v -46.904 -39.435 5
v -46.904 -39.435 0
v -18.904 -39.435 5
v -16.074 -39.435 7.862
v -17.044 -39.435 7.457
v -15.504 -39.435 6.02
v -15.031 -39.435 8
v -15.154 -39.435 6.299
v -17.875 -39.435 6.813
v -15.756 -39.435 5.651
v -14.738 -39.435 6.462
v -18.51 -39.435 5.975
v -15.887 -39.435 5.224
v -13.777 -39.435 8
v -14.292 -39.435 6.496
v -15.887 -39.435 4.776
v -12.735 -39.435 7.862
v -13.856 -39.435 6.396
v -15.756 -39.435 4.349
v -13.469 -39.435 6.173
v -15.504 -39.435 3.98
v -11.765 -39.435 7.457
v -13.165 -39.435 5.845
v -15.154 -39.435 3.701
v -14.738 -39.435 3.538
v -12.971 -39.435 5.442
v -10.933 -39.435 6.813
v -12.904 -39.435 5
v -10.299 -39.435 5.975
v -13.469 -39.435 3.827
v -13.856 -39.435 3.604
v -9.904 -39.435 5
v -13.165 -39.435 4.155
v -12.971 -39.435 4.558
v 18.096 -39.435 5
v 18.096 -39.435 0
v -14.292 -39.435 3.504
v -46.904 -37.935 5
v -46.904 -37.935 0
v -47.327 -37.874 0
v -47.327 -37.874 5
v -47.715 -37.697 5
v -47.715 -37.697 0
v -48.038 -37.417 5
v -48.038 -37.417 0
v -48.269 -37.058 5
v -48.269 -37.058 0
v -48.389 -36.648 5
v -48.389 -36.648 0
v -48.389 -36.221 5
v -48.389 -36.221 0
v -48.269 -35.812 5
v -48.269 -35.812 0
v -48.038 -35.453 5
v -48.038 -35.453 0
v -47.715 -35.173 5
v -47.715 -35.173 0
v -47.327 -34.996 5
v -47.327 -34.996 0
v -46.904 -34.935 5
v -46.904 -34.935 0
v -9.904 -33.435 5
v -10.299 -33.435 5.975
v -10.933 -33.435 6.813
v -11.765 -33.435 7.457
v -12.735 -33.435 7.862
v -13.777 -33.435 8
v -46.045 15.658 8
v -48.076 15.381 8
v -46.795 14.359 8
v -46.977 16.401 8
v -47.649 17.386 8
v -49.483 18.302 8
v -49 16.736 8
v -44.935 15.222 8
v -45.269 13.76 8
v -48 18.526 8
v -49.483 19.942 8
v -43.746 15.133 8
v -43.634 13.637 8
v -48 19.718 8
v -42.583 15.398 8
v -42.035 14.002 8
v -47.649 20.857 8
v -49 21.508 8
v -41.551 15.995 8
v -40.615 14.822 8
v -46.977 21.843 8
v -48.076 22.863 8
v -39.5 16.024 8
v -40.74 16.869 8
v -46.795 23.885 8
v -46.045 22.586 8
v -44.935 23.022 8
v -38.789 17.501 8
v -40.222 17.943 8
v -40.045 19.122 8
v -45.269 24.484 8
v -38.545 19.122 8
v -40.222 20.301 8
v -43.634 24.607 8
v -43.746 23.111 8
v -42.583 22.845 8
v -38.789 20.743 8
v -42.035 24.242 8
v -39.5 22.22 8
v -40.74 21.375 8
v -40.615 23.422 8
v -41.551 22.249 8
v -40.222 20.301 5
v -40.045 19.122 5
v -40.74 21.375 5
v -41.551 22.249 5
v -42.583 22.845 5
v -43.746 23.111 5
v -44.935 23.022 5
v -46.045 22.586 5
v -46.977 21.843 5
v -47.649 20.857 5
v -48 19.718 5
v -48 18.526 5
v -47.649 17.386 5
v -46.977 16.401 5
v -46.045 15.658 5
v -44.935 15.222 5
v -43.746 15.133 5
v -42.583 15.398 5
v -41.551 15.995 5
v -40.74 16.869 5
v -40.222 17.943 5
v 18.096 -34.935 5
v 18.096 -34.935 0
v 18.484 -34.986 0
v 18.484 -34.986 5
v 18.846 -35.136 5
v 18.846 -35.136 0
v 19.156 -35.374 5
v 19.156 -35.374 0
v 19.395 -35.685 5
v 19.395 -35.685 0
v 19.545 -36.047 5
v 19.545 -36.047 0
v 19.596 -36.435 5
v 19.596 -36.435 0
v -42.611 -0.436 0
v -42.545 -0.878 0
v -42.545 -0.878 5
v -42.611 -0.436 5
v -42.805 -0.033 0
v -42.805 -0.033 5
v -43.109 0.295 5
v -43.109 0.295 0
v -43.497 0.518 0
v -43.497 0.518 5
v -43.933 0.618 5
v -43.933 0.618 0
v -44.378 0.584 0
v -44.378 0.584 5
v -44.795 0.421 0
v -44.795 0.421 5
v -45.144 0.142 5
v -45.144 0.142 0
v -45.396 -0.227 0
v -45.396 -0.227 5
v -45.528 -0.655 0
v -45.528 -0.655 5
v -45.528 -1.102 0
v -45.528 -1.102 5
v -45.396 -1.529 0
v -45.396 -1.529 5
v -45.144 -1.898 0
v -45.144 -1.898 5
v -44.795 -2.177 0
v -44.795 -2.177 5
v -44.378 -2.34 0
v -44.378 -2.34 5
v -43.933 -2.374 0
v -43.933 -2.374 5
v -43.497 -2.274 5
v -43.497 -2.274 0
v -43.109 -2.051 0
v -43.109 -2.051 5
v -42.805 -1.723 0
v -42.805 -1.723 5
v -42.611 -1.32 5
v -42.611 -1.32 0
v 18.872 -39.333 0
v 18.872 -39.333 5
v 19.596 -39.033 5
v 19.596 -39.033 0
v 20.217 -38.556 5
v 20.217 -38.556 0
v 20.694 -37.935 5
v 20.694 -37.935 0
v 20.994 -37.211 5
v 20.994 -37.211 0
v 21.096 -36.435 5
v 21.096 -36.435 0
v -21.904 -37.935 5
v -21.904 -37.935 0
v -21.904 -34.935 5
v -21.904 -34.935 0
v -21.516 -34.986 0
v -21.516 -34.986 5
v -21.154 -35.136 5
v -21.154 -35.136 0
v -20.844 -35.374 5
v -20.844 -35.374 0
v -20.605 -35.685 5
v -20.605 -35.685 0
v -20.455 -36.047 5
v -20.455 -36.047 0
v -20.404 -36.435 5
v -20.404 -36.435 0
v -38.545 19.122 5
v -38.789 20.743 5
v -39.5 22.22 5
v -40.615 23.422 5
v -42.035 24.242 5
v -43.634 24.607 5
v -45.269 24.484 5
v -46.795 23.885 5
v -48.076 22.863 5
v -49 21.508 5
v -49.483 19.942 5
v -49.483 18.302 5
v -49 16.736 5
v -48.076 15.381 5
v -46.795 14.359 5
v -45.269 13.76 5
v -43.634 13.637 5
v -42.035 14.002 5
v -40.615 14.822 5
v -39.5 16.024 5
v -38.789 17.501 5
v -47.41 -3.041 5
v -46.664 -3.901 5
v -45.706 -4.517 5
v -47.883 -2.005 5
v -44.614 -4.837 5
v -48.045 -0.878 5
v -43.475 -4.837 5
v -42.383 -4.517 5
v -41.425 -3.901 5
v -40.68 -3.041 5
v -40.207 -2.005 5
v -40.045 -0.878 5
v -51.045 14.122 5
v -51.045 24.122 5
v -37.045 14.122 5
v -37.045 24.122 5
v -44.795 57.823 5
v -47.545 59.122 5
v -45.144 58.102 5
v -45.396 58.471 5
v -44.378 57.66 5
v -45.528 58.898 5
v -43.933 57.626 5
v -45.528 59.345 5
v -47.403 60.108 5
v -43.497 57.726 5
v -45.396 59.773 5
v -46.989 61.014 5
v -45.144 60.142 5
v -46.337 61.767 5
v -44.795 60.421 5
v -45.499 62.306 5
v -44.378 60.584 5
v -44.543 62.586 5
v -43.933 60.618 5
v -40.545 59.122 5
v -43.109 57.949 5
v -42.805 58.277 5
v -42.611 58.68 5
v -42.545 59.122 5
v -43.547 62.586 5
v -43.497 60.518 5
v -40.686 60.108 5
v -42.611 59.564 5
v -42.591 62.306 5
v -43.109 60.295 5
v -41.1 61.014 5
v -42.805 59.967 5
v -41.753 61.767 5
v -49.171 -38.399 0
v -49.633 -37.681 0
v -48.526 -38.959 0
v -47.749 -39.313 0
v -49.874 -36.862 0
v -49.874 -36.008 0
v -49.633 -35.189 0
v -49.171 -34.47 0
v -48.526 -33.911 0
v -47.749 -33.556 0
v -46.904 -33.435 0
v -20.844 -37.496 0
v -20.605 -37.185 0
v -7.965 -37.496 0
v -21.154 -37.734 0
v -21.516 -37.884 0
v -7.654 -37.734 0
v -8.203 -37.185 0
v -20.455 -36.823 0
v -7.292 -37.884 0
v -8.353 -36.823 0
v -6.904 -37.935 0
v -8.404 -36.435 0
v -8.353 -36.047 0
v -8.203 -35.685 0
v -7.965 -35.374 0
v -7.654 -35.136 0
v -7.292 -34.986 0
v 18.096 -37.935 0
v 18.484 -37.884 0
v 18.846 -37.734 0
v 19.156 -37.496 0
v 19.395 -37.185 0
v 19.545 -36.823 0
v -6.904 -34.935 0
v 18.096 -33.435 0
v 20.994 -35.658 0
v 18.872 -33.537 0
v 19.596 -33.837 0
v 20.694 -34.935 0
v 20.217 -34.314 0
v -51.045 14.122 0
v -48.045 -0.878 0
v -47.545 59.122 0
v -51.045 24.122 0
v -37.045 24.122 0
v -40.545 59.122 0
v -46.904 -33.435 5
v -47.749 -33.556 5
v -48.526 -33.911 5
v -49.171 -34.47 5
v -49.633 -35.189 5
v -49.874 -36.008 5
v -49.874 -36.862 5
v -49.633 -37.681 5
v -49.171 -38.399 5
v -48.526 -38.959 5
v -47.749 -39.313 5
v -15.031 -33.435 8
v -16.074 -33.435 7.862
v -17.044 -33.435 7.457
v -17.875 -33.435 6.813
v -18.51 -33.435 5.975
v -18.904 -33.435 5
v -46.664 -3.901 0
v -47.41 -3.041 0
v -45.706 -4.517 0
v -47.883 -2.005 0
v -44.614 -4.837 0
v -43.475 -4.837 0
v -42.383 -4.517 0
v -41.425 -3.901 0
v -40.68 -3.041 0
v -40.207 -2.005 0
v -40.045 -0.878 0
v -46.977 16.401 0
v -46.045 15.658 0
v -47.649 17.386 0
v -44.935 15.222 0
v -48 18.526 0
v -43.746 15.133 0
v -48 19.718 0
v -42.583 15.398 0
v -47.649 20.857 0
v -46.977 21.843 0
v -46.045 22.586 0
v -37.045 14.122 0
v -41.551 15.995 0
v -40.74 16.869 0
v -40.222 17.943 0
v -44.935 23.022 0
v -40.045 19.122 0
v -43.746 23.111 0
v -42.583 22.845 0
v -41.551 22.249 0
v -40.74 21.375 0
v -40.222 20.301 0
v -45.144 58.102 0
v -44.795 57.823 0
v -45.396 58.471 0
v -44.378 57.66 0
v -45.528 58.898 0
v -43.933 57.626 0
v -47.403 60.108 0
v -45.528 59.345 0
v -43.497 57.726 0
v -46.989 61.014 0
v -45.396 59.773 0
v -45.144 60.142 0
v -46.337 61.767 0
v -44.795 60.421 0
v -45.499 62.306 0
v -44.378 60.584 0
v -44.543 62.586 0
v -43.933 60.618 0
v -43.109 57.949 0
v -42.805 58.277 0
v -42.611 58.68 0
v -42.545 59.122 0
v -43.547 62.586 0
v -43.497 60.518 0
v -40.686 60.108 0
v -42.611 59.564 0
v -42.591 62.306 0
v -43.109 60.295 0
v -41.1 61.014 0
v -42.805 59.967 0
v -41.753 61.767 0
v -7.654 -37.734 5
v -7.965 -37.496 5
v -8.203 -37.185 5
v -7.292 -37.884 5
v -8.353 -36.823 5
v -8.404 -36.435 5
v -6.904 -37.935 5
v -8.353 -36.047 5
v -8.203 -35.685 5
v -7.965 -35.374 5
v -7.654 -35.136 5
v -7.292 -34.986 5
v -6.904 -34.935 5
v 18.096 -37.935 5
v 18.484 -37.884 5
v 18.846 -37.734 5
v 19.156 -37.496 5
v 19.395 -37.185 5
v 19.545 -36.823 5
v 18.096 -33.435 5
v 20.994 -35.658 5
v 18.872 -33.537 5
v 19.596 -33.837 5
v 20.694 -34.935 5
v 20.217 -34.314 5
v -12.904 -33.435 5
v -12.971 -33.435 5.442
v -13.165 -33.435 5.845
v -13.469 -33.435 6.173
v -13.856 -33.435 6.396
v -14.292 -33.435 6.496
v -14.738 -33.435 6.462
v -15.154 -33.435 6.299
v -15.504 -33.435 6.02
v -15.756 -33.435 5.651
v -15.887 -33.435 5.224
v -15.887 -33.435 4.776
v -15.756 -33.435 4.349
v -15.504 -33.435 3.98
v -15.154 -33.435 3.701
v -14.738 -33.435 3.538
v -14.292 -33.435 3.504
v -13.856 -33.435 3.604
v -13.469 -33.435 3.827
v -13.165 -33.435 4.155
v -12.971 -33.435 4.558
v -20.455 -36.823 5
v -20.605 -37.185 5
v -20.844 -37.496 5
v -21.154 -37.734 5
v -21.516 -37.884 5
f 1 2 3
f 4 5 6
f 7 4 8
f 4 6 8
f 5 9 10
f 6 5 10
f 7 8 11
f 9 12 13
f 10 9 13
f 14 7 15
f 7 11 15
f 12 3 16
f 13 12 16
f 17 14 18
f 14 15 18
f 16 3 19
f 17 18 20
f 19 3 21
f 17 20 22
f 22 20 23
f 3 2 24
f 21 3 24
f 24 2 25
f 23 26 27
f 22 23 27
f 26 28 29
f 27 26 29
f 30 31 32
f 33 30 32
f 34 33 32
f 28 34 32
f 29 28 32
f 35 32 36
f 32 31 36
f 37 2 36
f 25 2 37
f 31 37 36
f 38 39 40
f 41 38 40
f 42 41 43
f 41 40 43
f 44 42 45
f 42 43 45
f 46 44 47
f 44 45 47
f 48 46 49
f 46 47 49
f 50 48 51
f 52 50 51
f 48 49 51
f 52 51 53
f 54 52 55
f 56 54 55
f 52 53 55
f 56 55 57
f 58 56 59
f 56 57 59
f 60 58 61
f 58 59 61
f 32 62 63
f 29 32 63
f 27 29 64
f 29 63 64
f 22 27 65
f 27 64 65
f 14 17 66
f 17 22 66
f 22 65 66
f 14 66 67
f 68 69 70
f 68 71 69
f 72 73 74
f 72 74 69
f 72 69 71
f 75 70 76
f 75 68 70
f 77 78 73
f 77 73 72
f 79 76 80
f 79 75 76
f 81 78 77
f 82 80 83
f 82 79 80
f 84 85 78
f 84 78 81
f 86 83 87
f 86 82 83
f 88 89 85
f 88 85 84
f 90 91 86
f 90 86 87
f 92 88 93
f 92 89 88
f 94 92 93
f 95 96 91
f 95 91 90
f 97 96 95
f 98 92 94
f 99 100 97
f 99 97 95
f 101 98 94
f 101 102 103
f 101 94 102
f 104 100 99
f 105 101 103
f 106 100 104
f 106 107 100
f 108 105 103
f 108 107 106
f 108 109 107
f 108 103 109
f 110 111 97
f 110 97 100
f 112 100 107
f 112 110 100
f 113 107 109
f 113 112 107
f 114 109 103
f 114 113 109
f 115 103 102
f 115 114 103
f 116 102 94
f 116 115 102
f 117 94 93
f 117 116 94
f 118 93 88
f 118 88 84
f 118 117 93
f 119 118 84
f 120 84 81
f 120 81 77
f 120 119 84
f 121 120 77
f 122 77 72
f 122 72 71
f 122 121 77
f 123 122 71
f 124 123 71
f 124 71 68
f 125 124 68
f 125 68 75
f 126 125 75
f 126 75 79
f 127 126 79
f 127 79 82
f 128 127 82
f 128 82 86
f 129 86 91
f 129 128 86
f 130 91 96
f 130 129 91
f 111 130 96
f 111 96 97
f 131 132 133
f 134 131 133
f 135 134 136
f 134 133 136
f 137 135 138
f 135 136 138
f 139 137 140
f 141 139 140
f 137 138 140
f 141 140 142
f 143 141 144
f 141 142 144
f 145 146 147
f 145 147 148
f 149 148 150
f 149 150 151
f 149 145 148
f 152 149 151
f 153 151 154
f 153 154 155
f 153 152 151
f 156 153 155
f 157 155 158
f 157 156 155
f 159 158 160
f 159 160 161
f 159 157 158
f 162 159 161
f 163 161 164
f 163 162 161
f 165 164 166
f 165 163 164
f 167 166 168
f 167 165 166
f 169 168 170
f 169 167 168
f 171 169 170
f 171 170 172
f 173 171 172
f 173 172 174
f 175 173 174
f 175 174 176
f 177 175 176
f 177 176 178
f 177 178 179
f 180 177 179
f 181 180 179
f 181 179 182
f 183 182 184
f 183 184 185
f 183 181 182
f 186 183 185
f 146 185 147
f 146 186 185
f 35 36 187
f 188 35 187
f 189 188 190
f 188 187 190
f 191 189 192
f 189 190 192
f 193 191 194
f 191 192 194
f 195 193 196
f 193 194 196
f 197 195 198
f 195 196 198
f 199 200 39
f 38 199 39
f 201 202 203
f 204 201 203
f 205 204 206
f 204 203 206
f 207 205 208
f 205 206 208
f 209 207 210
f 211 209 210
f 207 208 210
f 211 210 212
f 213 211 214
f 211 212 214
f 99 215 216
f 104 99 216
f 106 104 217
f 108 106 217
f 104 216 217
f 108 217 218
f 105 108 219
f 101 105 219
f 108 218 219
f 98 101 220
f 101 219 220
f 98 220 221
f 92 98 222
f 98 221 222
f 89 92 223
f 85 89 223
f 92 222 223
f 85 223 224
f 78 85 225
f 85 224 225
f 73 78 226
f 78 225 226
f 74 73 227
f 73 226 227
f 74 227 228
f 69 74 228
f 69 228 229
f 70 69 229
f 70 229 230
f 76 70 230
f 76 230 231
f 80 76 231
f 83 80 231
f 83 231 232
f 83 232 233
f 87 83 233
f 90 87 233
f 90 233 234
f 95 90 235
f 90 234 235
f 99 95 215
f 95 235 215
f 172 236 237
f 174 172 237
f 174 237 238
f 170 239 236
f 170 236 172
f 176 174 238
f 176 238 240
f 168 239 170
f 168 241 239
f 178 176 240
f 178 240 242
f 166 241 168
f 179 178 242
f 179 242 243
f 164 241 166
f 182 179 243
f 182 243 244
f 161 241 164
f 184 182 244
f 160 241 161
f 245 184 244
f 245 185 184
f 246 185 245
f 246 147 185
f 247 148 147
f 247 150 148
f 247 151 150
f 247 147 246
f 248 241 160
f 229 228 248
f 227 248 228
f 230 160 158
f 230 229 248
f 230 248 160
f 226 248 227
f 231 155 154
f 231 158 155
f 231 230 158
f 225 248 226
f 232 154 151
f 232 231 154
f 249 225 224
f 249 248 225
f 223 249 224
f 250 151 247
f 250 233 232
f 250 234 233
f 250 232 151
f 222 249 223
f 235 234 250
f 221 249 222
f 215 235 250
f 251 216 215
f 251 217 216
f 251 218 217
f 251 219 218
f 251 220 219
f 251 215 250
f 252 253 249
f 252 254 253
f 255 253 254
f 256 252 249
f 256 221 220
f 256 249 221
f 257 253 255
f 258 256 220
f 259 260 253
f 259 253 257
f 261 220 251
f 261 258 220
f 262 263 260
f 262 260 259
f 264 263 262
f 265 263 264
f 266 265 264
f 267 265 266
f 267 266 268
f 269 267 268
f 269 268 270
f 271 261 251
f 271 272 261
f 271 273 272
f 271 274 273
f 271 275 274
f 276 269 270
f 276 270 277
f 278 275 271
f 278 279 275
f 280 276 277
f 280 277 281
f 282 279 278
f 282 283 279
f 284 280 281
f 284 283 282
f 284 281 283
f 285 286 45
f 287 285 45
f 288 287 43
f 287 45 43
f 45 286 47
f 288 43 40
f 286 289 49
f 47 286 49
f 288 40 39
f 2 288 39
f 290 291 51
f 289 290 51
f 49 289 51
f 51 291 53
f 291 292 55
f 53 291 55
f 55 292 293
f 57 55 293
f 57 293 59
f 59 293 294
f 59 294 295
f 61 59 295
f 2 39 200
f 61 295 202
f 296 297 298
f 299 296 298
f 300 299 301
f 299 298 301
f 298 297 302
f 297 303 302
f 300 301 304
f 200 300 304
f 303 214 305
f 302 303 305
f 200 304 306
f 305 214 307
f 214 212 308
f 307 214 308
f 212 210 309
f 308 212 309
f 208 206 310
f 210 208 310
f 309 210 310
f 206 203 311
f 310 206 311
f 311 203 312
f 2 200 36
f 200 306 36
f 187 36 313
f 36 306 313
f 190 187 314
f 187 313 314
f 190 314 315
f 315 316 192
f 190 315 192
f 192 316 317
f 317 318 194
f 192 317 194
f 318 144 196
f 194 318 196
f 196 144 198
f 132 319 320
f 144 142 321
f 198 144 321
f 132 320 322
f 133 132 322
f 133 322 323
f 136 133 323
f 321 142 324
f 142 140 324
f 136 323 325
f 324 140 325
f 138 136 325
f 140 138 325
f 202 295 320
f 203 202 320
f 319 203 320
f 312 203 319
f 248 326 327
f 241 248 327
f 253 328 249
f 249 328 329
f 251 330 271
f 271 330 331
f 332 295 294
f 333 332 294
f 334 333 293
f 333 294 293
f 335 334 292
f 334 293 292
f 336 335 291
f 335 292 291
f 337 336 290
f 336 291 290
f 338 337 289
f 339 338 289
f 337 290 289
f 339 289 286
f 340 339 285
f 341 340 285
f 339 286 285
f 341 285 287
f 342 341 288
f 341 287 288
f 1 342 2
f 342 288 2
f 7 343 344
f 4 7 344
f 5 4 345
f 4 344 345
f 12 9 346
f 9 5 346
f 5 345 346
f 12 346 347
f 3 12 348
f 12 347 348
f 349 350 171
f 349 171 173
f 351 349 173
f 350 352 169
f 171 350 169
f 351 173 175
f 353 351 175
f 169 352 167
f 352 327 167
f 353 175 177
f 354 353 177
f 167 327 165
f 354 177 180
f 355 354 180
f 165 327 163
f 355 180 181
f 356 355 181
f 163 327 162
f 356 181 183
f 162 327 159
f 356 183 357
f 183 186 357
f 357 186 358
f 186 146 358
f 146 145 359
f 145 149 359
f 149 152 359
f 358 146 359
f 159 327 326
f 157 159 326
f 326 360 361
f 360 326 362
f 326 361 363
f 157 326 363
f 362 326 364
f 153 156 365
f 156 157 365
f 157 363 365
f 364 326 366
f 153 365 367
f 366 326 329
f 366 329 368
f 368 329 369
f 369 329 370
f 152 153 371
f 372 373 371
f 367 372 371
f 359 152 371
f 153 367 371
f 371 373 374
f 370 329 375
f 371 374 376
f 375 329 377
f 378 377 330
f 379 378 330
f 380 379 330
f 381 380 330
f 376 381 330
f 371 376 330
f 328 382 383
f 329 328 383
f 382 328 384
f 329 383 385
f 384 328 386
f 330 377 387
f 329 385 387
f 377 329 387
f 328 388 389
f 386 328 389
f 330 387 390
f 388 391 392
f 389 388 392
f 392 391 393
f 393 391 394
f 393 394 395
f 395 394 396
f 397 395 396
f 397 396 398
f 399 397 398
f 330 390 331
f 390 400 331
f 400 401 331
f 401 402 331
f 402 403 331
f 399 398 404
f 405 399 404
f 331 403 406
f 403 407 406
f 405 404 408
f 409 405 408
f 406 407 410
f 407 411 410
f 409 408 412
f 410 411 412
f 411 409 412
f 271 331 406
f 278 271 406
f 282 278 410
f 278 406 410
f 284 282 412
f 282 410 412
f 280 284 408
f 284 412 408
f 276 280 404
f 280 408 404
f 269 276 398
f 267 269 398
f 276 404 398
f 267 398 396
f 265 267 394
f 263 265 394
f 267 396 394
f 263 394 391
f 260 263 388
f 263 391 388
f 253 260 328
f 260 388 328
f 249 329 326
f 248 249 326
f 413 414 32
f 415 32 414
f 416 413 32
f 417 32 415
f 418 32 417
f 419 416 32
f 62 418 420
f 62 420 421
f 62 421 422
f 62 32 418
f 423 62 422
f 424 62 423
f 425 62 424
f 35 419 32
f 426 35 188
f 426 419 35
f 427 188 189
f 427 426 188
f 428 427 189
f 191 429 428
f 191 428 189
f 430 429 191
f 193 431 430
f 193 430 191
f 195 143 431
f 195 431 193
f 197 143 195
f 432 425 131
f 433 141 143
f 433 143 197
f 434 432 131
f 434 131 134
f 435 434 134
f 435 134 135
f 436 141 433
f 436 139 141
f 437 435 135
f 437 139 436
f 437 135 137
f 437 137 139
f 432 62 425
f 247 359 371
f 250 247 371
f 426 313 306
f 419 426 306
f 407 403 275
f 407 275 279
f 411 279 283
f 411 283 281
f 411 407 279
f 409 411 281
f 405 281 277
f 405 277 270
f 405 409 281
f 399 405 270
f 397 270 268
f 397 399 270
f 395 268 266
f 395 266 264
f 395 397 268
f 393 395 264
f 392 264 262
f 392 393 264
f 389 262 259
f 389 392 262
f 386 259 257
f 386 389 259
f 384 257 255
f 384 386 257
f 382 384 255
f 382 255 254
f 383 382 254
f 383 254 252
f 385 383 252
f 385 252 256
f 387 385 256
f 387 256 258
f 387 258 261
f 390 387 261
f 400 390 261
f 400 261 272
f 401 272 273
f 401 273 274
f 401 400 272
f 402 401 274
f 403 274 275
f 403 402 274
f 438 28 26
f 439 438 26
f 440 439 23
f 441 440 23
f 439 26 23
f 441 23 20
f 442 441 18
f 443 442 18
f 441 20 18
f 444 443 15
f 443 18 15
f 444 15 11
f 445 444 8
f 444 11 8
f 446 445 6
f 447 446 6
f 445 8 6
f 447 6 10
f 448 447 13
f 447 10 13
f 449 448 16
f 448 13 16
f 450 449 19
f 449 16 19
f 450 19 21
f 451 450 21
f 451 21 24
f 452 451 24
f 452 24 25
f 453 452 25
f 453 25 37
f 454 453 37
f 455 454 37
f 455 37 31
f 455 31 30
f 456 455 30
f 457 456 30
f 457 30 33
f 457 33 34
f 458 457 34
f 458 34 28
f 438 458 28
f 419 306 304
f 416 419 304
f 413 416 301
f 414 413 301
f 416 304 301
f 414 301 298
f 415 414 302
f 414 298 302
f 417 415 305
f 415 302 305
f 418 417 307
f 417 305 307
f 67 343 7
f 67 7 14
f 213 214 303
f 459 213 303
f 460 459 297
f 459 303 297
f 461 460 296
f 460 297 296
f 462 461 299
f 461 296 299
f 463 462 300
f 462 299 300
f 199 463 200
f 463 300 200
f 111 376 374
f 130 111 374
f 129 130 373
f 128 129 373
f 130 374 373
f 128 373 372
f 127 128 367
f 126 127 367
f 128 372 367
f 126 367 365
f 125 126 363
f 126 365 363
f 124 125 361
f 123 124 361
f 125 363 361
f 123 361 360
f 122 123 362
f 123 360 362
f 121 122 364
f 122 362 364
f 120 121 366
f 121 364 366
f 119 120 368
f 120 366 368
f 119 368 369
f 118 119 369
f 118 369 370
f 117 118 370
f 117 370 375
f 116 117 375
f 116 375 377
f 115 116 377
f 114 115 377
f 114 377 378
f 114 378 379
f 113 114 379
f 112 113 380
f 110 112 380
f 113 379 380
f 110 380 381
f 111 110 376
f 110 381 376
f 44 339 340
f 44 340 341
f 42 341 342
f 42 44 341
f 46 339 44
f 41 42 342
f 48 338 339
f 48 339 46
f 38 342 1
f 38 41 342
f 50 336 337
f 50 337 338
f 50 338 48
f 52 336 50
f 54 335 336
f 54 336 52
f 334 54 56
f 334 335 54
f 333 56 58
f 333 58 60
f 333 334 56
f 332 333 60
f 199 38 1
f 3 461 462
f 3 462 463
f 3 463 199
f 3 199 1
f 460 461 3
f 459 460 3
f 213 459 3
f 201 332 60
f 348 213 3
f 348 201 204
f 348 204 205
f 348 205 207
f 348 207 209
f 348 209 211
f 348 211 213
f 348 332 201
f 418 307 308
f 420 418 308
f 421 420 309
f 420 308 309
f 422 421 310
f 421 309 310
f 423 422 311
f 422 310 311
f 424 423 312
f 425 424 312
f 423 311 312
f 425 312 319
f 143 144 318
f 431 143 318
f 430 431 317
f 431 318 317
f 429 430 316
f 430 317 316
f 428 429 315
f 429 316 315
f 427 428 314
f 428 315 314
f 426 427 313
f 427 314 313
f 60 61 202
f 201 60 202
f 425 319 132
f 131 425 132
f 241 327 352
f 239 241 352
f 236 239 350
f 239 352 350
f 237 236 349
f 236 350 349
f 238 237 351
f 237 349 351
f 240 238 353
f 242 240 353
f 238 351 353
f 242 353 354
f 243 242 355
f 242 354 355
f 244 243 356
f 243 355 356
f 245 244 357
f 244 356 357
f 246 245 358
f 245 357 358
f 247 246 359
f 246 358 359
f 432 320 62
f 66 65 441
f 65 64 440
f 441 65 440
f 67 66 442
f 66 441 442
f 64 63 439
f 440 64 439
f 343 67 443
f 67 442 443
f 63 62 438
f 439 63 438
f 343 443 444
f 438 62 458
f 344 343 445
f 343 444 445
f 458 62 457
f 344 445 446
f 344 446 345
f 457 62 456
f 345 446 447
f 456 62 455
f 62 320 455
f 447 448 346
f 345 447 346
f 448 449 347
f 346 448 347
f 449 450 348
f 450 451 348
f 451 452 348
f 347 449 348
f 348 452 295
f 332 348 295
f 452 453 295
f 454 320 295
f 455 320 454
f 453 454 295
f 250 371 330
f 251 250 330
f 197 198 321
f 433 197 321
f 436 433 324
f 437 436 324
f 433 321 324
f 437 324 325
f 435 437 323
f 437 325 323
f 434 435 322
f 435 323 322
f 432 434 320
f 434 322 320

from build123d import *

# Parameters (mm, degrees)
F0_R         = 1.5
F1_DEPTH     = 5
F2_R         = 5.5
F2_R_2       = 4
F3_DEPTH     = 3
F5_DEPTH     = 5
F6_W         = 9
F6_H         = 6
F7_DEPTH     = 3
F8_R         = 1.5
F9_DEPTH     = 25
F10_T1_DEPTH = 25.364916731


# Not quite as in the source:
# - a fillet or chamfer that OpenCascade refuses, or shapes differently, is made with other operations: its cross-section is extruded or revolved along the edge and cut away or added


with BuildPart() as f1:
    # F0 (on Top) → F1 (new body)
    with BuildSketch(Plane.XY):
        with BuildLine():
            ThreePointArc((-48.0446585417, 19.1218993813), (-44.0446585417, 23.1218993813), (-40.0446585417, 19.1218993813))
            Line((-40.0446585417, 19.1218993813), (-37.0446585417, 19.1218993813))
            Line((-37.0446585417, 19.1218993813), (-37.0446585417, 24.1218993813))
            Line((-37.0446585417, 24.1218993813), (-40.5446585417, 59.1218993813))
            ThreePointArc((-40.5446585417, 59.1218993813), (-44.0446585417, 55.6218993813), (-47.5446585417, 59.1218993813))
            Line((-47.5446585417, 59.1218993813), (-51.0446585417, 24.1218993813))
            Line((-51.0446585417, 24.1218993813), (-51.0446585417, 19.1218993813))
            Line((-51.0446585417, 19.1218993813), (-48.0446585417, 19.1218993813))
        make_face()
        with BuildLine():
            Line((-37.0446585417, 19.1218993813), (-40.0446585417, 19.1218993813))
            ThreePointArc((-40.0446585417, 19.1218993813), (-44.0446585417, 15.1218993813), (-48.0446585417, 19.1218993813))
            Line((-48.0446585417, 19.1218993813), (-51.0446585417, 19.1218993813))
            Line((-51.0446585417, 19.1218993813), (-51.0446585417, 14.1218993813))
            Line((-51.0446585417, 14.1218993813), (-48.0446585417, -0.8781006187))
            ThreePointArc((-48.0446585417, -0.8781006187), (-44.0446585417, 3.1218993813), (-40.0446585417, -0.8781006187))
            Line((-40.0446585417, -0.8781006187), (-37.0446585417, 14.1218993813))
            Line((-37.0446585417, 14.1218993813), (-37.0446585417, 19.1218993813))
        make_face()
        with BuildLine():
            ThreePointArc((-48.0446585417, -0.8781006187), (-44.0446585417, -4.8781006187), (-40.0446585417, -0.8781006187))
            ThreePointArc((-40.0446585417, -0.8781006187), (-44.0446585417, 3.1218993813), (-48.0446585417, -0.8781006187))
        make_face()
        with Locations((-44.0446585417, -0.8781006187)):
            Circle(F0_R, mode=Mode.SUBTRACT)
        with BuildLine():
            ThreePointArc((-47.5446585417, 59.1218993813), (-44.0446585417, 55.6218993813), (-40.5446585417, 59.1218993813))
            ThreePointArc((-40.5446585417, 59.1218993813), (-44.0446585417, 62.6218993813), (-47.5446585417, 59.1218993813))
        make_face()
        with Locations((-44.0446585417, 59.1218993813)):
            Circle(F0_R, mode=Mode.SUBTRACT)
    extrude(amount=F1_DEPTH)

    # F2 (on face) → F3 (join)
    with BuildSketch(Plane.XY.offset(5)):
        with Locations((-44.0446585417, 19.1218993813)):
            Circle(F2_R)
        with Locations((-44.0446585417, 19.1218993813)):
            Circle(F2_R_2, mode=Mode.SUBTRACT)
    extrude(amount=F3_DEPTH)


with BuildPart() as f5:
    # F4 (on Top) → F5 (new body)
    with BuildSketch(Plane.XY):
        with BuildLine():
            ThreePointArc((-46.904212172, -33.4348478615), (-45.404212172, -33.8367716502), (-44.3061359607, -34.9348478615))
            Line((-44.3061359607, -34.9348478615), (-21.904212172, -34.9348478615))
            ThreePointArc((-21.904212172, -34.9348478615), (-20.8435520003, -35.3741876897), (-20.404212172, -36.4348478615))
            Line((-20.404212172, -36.4348478615), (-8.404212172, -36.4348478615))
            ThreePointArc((-8.404212172, -36.4348478615), (-7.9648723438, -35.3741876897), (-6.904212172, -34.9348478615))
            Line((-6.904212172, -34.9348478615), (15.4977116166, -34.9348478615))
            ThreePointArc((15.4977116166, -34.9348478615), (16.595787828, -33.8367716502), (18.095787828, -33.4348478615))
            Line((18.095787828, -33.4348478615), (-46.904212172, -33.4348478615))
        make_face()
        with BuildLine():
            Line((-21.904212172, -37.9348478615), (-44.3061359607, -37.9348478615))
            ThreePointArc((-44.3061359607, -37.9348478615), (-45.404212172, -39.0329240729), (-46.904212172, -39.4348478615))
            Line((-46.904212172, -39.4348478615), (18.095787828, -39.4348478615))
            ThreePointArc((18.095787828, -39.4348478615), (16.595787828, -39.0329240729), (15.4977116166, -37.9348478615))
            Line((15.4977116166, -37.9348478615), (-6.904212172, -37.9348478615))
            ThreePointArc((-6.904212172, -37.9348478615), (-7.9648723438, -37.4955080333), (-8.404212172, -36.4348478615))
            Line((-8.404212172, -36.4348478615), (-20.404212172, -36.4348478615))
            ThreePointArc((-20.404212172, -36.4348478615), (-20.8435520003, -37.4955080333), (-21.904212172, -37.9348478615))
        make_face()
        with BuildLine():
            ThreePointArc((-46.904212172, -37.9348478615), (-48.404212172, -36.4348478615), (-46.904212172, -34.9348478615))
            Line((-46.904212172, -34.9348478615), (-44.3061359607, -34.9348478615))
            ThreePointArc((-44.3061359607, -34.9348478615), (-45.404212172, -33.8367716502), (-46.904212172, -33.4348478615))
            ThreePointArc((-46.904212172, -33.4348478615), (-49.904212172, -36.4348478615), (-46.904212172, -39.4348478615))
            ThreePointArc((-46.904212172, -39.4348478615), (-45.404212172, -39.0329240729), (-44.3061359607, -37.9348478615))
            Line((-44.3061359607, -37.9348478615), (-46.904212172, -37.9348478615))
        make_face()
        with BuildLine():
            ThreePointArc((21.095787828, -36.4348478615), (20.2171081715, -34.313527518), (18.095787828, -33.4348478615))
            ThreePointArc((18.095787828, -33.4348478615), (16.595787828, -33.8367716502), (15.4977116166, -34.9348478615))
            Line((15.4977116166, -34.9348478615), (18.095787828, -34.9348478615))
            ThreePointArc((18.095787828, -34.9348478615), (19.1564479997, -35.3741876897), (19.595787828, -36.4348478615))
            ThreePointArc((19.595787828, -36.4348478615), (19.1564479997, -37.4955080333), (18.095787828, -37.9348478615))
            Line((18.095787828, -37.9348478615), (15.4977116166, -37.9348478615))
            ThreePointArc((15.4977116166, -37.9348478615), (16.595787828, -39.0329240729), (18.095787828, -39.4348478615))
            ThreePointArc((18.095787828, -39.4348478615), (20.2171081715, -38.5561682051), (21.095787828, -36.4348478615))
        make_face()
    extrude(amount=F5_DEPTH)

    # F6 (on face) → F7 (join)
    with BuildSketch(Plane.XY.offset(5)):
        with Locations((-14.404212172, -36.4348478615)):
            Rectangle(F6_W, F6_H)
    extrude(amount=F7_DEPTH)

    # F8 (on face) → F9 (cut)
    with BuildSketch(Plane.XZ.offset(39.4348478615)):
        with Locations((-14.404212172, 5)):
            Circle(F8_R)
    extrude(amount=-F9_DEPTH, mode=Mode.SUBTRACT)

    # F10: fillet of radius 4 on 2 edges, made by hand

    # F10_s2 → F10_t1 (cut)
    with BuildSketch(Plane.XZ.offset(23.752389496)):
        with BuildLine():
            ThreePointArc((-15.0312288258, 8), (-17.4807185686, 7.1622776602), (-18.904212172, 5))
            Line((-18.904212172, 5), (-18.904212172, 8))
            Line((-18.904212172, 8), (-15.0312288258, 8))
        make_face()
        with BuildLine():
            ThreePointArc((-9.904212172, 5), (-11.3277057755, 7.1622776602), (-13.7771955183, 8))
            Line((-13.7771955183, 8), (-9.904212172, 8))
            Line((-9.904212172, 8), (-9.904212172, 5))
        make_face()
    extrude(amount=F10_T1_DEPTH, mode=Mode.SUBTRACT)


solid = Compound([f1.part, f5.part])
